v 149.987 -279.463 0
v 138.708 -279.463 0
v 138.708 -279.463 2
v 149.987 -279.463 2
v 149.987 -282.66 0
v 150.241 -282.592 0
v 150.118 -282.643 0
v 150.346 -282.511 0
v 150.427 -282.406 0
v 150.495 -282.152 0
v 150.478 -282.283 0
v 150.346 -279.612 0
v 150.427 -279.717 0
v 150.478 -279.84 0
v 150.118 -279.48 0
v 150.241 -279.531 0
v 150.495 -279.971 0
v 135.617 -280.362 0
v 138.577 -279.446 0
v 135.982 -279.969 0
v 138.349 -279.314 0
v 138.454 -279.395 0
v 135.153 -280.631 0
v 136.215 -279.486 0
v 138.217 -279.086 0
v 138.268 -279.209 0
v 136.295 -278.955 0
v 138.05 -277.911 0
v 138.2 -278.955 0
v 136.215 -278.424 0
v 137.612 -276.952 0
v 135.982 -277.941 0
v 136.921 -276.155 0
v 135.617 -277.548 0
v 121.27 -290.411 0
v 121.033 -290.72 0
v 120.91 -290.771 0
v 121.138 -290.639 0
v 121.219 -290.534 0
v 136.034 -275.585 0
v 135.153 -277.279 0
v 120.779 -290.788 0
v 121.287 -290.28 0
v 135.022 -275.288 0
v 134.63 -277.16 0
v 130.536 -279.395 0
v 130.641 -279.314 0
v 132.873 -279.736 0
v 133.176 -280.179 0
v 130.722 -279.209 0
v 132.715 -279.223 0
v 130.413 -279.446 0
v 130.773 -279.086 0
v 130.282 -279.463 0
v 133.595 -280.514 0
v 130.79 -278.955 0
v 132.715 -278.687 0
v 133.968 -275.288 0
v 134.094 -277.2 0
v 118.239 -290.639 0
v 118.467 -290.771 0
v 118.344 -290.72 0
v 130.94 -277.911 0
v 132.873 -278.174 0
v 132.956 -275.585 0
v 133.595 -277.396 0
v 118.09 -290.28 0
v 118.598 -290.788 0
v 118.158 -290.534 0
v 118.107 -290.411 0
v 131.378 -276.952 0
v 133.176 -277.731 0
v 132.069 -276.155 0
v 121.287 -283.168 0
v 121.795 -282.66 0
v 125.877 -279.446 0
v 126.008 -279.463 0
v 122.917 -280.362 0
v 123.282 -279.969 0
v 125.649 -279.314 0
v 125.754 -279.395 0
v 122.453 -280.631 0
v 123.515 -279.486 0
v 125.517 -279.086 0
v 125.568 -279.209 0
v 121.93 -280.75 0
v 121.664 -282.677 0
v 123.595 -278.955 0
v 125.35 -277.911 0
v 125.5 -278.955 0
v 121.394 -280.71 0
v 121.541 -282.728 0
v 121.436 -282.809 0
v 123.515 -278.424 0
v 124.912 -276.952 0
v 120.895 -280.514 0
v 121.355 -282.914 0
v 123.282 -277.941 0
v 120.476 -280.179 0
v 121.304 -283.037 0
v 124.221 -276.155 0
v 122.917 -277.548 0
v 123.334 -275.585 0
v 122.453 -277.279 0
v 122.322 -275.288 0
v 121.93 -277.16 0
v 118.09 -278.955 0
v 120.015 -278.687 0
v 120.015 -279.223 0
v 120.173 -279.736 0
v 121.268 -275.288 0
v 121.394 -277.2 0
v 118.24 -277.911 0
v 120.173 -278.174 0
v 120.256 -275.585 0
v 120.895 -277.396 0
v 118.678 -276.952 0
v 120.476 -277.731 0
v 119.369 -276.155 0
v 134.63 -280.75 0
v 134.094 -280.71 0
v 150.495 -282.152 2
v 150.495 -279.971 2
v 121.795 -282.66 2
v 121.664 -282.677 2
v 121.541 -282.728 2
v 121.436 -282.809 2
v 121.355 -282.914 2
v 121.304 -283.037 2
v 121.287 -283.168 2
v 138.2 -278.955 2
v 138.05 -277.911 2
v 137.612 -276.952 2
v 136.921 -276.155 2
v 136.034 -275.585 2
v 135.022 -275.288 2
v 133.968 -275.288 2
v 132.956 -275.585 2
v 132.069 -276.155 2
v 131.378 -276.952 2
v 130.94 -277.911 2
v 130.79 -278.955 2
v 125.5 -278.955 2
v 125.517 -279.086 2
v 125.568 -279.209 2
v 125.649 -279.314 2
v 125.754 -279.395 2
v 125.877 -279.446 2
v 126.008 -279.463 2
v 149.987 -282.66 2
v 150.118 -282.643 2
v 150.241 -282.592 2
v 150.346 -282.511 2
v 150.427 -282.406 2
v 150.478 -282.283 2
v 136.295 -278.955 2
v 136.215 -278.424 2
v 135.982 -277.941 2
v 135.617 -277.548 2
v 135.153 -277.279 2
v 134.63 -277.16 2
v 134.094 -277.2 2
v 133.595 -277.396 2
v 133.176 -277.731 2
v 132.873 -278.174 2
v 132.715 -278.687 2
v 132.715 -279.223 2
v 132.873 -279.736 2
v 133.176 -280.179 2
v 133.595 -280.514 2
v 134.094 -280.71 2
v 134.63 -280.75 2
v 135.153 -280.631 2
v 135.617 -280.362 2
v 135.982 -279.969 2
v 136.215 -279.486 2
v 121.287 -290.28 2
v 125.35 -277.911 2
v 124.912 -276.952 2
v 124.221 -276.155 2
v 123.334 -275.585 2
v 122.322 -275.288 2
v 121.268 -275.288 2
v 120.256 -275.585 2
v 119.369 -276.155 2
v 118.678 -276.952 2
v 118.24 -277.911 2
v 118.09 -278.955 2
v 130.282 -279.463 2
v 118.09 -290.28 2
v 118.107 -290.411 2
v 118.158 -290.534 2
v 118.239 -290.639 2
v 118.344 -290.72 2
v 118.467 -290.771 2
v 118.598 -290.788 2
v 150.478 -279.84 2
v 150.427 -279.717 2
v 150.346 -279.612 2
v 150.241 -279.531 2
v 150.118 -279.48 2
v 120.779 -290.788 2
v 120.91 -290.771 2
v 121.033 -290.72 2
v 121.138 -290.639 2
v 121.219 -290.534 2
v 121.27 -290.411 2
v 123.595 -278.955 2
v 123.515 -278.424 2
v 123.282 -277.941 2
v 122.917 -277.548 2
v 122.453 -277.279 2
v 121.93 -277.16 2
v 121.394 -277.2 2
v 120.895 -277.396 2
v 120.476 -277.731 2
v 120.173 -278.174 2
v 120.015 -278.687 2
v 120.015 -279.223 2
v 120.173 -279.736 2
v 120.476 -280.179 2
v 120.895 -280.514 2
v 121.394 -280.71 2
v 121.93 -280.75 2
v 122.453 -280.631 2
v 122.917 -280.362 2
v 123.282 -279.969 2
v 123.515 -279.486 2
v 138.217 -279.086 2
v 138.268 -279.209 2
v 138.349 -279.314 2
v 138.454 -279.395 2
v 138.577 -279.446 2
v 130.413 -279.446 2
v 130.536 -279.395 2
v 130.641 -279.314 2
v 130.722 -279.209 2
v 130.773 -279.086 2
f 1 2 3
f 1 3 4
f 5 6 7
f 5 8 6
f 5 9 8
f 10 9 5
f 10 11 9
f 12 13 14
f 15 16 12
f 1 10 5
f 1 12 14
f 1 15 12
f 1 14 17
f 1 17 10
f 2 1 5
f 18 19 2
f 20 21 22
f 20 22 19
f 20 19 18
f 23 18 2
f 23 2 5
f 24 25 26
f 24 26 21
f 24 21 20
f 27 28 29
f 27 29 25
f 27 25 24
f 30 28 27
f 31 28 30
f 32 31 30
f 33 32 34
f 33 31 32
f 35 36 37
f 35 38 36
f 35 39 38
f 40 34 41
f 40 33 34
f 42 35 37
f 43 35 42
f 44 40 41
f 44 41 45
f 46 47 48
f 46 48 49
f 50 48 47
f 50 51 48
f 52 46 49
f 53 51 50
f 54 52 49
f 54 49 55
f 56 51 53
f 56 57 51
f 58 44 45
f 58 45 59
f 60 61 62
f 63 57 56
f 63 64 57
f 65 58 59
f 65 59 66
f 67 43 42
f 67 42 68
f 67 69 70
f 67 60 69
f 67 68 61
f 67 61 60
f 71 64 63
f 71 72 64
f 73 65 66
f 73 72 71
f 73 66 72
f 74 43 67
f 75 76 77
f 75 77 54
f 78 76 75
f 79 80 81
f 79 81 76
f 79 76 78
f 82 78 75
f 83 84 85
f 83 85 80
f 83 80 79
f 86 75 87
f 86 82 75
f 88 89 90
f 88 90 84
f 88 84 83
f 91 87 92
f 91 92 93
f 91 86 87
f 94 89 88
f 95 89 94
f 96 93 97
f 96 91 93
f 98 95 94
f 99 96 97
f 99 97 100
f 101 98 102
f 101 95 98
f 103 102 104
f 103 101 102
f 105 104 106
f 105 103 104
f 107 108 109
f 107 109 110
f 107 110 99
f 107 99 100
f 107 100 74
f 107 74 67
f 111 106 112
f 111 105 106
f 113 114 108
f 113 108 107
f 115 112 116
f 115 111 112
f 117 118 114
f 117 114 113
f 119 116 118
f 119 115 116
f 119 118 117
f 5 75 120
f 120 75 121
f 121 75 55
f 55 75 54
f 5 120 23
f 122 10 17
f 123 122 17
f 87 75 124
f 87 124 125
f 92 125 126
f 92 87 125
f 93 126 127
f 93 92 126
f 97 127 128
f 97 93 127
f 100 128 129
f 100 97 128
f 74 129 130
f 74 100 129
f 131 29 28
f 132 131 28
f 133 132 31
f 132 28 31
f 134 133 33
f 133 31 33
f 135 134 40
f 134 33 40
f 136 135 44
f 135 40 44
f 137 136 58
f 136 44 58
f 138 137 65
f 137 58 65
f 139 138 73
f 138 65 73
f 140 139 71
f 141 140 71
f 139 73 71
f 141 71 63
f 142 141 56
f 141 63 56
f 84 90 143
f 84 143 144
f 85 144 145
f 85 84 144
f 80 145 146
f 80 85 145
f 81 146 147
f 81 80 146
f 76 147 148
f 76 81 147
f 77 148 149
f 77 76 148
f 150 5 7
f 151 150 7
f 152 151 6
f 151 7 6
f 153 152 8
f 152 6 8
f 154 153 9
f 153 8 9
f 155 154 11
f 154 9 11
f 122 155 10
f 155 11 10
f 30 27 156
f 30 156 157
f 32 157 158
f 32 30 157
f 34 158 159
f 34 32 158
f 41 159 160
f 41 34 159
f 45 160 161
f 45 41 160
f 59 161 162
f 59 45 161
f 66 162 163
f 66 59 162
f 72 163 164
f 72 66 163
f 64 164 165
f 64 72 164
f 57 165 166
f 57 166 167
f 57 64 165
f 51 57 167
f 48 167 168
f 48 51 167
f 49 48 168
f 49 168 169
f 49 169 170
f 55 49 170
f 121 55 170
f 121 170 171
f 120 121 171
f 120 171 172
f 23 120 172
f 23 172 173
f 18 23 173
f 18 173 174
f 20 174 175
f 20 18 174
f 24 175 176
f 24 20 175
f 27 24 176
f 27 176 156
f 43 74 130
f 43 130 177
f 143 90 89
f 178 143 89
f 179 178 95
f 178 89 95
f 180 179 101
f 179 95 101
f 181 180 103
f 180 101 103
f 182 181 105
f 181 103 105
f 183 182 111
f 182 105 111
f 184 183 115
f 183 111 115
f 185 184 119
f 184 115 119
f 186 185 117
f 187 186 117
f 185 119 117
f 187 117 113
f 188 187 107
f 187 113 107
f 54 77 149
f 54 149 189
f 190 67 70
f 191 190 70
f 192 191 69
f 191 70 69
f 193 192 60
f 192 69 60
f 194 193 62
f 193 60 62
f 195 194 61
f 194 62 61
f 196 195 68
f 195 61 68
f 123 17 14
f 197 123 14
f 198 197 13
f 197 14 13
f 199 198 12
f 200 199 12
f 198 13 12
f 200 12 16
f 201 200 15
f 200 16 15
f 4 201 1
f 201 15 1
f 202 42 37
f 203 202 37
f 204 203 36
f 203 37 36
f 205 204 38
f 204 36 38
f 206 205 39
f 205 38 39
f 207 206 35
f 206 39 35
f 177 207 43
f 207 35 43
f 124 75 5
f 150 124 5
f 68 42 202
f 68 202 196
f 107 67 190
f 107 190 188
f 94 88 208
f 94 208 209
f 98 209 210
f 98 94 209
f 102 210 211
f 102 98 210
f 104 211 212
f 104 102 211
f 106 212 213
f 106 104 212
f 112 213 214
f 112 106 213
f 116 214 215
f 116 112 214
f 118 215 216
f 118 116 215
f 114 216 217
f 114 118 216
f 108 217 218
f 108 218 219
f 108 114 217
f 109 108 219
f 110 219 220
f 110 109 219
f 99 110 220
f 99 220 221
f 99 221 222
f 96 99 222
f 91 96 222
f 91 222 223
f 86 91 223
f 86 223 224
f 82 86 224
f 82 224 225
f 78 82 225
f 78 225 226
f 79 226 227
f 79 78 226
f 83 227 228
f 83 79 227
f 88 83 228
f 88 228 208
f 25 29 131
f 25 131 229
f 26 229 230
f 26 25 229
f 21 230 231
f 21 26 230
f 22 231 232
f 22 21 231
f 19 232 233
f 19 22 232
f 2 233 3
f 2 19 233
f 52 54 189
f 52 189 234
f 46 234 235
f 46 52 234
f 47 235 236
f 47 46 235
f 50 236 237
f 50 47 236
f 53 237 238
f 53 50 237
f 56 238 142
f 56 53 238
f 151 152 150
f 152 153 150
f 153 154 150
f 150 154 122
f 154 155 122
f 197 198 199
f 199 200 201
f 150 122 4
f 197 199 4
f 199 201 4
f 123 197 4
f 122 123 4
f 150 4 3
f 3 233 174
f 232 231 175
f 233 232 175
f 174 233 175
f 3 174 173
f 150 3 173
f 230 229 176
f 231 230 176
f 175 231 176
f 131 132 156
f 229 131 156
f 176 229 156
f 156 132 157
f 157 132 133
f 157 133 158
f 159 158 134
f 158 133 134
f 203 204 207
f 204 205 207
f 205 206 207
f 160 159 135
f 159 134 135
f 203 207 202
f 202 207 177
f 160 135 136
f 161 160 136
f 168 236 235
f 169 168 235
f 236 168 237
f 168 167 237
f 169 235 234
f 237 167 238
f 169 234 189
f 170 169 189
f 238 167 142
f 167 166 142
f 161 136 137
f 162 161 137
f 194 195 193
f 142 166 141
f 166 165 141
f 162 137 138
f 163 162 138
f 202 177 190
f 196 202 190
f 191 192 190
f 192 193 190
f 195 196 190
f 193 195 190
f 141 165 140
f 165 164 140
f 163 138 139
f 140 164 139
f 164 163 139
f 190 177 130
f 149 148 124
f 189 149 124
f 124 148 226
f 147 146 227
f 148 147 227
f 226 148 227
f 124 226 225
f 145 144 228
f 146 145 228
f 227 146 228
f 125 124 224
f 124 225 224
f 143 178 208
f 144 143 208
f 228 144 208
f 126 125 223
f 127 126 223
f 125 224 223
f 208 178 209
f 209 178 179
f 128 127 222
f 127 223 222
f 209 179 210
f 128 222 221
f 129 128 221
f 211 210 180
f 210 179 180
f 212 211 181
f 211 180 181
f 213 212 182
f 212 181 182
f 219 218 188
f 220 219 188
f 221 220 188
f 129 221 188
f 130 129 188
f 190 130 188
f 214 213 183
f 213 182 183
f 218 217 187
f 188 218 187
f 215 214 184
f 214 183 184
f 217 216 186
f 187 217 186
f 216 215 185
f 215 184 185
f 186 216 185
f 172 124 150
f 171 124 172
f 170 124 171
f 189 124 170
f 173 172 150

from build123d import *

# Parameters (mm, degrees)
SKETCH005_R = 1.8
PAD_DEPTH   = 2


with BuildPart() as part:
    # Sketch005 → Pad (new body)
    with BuildSketch(Plane.XY):
        with BuildLine():
            Line((121.287, -283.168), (121.287, -290.28))
            ThreePointArc((120.779, -290.788), (121.13821, -290.63921), (121.287, -290.28))
            Line((120.779, -290.788), (118.598, -290.788))
            ThreePointArc((118.09, -290.28), (118.23879, -290.63921), (118.598, -290.788))
            Line((118.09, -290.28), (118.09, -278.955))
            ThreePointArc((125.5, -278.955), (121.795, -275.25), (118.09, -278.955))
            ThreePointArc((125.5, -278.955), (125.64879, -279.31421), (126.008, -279.463))
            Line((126.008, -279.463), (130.282, -279.463))
            ThreePointArc((130.282, -279.463), (130.64121, -279.31421), (130.79, -278.955))
            ThreePointArc((138.2, -278.955), (134.495, -275.25), (130.79, -278.955))
            ThreePointArc((138.2, -278.955), (138.34879, -279.31421), (138.708, -279.463))
            Line((138.708, -279.463), (149.987, -279.463))
            ThreePointArc((150.495, -279.971), (150.34621, -279.61179), (149.987, -279.463))
            Line((150.495, -282.152), (150.495, -279.971))
            ThreePointArc((149.987, -282.66), (150.34621, -282.51121), (150.495, -282.152))
            Line((121.795, -282.66), (149.987, -282.66))
            ThreePointArc((121.795, -282.66), (121.43579, -282.80879), (121.287, -283.168))
        make_face()
        with Locations((121.795, -278.955)):
            Circle(SKETCH005_R, mode=Mode.SUBTRACT)
        with Locations((134.495, -278.955)):
            Circle(SKETCH005_R, mode=Mode.SUBTRACT)
    extrude(amount=PAD_DEPTH)


solid = part.part
